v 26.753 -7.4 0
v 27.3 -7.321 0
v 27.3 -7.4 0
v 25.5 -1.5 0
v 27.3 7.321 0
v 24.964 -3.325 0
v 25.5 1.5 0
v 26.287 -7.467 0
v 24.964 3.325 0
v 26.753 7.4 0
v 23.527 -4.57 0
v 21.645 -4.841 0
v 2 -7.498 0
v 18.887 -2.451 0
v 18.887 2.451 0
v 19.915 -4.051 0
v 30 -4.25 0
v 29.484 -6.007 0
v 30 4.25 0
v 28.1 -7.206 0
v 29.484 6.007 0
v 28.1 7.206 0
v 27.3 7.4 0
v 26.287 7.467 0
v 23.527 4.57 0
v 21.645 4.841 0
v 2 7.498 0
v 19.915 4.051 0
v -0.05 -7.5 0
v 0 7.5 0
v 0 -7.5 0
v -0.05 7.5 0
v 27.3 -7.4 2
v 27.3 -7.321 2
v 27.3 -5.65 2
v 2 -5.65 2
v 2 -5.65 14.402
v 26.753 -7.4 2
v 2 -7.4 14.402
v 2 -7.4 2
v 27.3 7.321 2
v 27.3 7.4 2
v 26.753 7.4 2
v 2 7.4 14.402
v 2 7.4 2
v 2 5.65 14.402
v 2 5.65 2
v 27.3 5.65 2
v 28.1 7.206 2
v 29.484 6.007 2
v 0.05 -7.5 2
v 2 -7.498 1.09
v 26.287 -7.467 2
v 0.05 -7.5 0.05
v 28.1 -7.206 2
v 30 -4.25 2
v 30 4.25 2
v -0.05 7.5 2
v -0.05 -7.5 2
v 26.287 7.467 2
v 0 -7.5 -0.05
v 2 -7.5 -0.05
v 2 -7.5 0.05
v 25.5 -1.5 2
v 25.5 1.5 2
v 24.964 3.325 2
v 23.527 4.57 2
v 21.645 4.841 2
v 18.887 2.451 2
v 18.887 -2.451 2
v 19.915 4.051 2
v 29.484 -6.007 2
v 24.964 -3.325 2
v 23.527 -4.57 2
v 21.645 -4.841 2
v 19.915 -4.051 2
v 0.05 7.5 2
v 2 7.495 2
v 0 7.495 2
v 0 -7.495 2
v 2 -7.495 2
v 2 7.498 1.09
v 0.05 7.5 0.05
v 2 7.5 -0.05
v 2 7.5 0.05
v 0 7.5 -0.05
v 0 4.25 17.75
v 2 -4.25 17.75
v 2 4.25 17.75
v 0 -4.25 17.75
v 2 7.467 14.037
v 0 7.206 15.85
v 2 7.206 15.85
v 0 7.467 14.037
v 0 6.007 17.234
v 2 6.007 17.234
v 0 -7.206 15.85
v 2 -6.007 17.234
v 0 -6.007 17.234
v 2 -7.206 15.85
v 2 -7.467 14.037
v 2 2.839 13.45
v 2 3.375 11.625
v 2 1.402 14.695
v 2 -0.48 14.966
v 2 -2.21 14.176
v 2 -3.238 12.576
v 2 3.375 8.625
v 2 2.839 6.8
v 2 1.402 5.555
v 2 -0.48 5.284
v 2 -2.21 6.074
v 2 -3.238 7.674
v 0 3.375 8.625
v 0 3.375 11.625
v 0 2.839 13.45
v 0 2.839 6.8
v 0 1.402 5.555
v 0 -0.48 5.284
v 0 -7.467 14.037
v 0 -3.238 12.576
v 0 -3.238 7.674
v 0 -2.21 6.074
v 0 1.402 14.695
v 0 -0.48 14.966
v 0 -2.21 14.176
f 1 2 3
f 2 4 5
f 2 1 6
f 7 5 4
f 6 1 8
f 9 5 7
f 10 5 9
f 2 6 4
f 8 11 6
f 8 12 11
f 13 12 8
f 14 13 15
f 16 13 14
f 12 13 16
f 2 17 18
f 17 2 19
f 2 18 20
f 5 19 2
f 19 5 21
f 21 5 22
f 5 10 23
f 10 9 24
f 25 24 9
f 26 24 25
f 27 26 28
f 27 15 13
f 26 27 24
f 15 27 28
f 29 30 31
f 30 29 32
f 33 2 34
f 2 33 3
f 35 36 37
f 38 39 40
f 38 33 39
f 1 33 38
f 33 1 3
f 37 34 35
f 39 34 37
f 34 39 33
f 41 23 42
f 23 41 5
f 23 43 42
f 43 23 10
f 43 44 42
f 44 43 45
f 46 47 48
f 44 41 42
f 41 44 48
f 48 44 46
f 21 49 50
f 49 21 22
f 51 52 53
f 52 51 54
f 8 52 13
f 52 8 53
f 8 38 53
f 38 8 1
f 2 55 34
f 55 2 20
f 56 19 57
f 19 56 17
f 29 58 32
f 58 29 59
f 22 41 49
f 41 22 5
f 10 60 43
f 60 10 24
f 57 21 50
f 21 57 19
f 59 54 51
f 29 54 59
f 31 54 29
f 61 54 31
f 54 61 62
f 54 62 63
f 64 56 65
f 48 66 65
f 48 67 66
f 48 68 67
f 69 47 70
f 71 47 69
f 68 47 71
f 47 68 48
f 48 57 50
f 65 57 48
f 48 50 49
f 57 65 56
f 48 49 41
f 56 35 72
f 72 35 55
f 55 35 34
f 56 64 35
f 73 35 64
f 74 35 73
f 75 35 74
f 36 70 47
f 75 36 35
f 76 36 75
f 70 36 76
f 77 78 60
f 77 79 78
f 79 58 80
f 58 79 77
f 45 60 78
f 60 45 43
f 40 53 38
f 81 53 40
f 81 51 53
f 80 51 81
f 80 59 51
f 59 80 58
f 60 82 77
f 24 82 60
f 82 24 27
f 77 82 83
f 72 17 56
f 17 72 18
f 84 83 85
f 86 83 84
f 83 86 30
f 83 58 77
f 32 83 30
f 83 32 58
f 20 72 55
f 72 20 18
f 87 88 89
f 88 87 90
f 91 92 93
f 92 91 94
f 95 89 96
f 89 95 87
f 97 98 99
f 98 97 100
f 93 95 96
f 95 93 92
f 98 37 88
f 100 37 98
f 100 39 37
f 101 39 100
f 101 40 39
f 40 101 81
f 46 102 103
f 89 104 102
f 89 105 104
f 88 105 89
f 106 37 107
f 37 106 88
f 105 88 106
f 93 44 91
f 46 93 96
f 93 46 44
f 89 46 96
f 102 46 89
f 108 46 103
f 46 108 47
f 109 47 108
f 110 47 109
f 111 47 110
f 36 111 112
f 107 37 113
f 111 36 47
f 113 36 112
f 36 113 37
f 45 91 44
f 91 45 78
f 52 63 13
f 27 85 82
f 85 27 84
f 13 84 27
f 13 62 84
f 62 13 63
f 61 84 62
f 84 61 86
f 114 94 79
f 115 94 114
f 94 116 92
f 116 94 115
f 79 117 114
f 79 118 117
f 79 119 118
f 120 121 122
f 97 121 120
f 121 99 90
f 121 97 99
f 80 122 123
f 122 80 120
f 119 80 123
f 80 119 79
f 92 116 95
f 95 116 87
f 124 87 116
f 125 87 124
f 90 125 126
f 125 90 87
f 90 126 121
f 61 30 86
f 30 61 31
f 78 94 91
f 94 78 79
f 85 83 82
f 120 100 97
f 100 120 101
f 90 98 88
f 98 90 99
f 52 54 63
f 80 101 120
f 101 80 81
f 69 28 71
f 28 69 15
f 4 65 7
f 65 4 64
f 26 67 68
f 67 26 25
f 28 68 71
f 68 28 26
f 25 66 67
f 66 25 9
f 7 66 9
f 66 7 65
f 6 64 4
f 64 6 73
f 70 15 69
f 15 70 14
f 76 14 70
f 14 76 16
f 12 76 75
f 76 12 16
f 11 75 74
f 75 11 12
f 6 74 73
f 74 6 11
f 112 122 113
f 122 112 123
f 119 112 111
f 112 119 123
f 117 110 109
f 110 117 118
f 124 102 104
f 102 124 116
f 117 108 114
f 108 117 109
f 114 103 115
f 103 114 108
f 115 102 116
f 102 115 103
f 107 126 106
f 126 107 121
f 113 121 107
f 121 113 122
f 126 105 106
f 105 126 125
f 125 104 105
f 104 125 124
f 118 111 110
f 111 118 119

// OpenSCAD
//********************************************************************
//********************************************************************
//Simple drawer or shelf bracket
//by Marc Sulfridge
//********************************************************************
//********************************************************************

//********************************************************************
//User defined parameters
//********************************************************************
//Width of bracket.
width = 15; // [2:25]
//Lenght of side reinforcement triangles.
side_len = 27.5; // [5:50]
//Height of side reinforcement triangles.
side_ht = 14.5; // [5:50]
//Length of horizontal base.
length = 30; // [5:50]
//Height of vertical base.
up_ht = 17.75; // [5:50]
//Thickness of base and side.
thick = 2; // [0.25:2.5]
//Thickness of side reinforcement triangles.
side_thk = 1.75; // [0.25:2.5]
//Radius of corner fillets.
fillet_rad = 3.25; // [0.5:5]
//Distance between end of horizontal base and center of horizontal hole.
base_hole_gap = 4.5; // [1:10]
//Distance between top of vertical base and center of vertical hole.
side_hole_gap = 5.25; // [1:10]
//Short axis (diameter) of screw holes.
hole_dia = 6.75; // [1:10]
//Long axis (length) of screw holes.
hole_wid = 9.75; // [2:20]
//Fudge factor to ensure overlaps.
dt = 0.1; // [0.001,0.01,0.1]
//********************************************************************

module hole(){
	hull(){
		for (i=[-1,1]){
			translate([0,i*(hole_wid-hole_dia)/2,-dt/2])
			cylinder(r=hole_dia/2,h=thick+dt,center=false);
		}
	}
}

module side(){
	hull(){
		cube([dt,side_thk,side_ht], center=false);

		translate([side_len-thick,0,0])
		cube([dt,side_thk,thick], center=false);
	}
}

module base(long){
	translate([0,0,thick/2])
	hull(){
		cube([dt,width,thick], center=true);
		
		for (i=[-1,1]){
			translate([long-fillet_rad,i*(width/2-fillet_rad),0])
			cylinder(r=fillet_rad,h=thick,center=true);
		}
	}
}

module upright(long){
	translate([thick,0,0])
	rotate([0,-90,0])
	base(long);
}

difference(){
	union(){
		base(length);
		upright(up_ht);
		
		for (i=[-width/2+dt, width/2-side_thk-dt]){
			translate([thick-3*dt,i,0])
			side();
		}
	}

	translate([length-base_hole_gap-hole_dia/2,0,0])
	hole();

	translate([thick,0,side_hole_gap+hole_wid/2])
	rotate([0,-90,0])
	rotate([0,0,90])
	hole();
}
